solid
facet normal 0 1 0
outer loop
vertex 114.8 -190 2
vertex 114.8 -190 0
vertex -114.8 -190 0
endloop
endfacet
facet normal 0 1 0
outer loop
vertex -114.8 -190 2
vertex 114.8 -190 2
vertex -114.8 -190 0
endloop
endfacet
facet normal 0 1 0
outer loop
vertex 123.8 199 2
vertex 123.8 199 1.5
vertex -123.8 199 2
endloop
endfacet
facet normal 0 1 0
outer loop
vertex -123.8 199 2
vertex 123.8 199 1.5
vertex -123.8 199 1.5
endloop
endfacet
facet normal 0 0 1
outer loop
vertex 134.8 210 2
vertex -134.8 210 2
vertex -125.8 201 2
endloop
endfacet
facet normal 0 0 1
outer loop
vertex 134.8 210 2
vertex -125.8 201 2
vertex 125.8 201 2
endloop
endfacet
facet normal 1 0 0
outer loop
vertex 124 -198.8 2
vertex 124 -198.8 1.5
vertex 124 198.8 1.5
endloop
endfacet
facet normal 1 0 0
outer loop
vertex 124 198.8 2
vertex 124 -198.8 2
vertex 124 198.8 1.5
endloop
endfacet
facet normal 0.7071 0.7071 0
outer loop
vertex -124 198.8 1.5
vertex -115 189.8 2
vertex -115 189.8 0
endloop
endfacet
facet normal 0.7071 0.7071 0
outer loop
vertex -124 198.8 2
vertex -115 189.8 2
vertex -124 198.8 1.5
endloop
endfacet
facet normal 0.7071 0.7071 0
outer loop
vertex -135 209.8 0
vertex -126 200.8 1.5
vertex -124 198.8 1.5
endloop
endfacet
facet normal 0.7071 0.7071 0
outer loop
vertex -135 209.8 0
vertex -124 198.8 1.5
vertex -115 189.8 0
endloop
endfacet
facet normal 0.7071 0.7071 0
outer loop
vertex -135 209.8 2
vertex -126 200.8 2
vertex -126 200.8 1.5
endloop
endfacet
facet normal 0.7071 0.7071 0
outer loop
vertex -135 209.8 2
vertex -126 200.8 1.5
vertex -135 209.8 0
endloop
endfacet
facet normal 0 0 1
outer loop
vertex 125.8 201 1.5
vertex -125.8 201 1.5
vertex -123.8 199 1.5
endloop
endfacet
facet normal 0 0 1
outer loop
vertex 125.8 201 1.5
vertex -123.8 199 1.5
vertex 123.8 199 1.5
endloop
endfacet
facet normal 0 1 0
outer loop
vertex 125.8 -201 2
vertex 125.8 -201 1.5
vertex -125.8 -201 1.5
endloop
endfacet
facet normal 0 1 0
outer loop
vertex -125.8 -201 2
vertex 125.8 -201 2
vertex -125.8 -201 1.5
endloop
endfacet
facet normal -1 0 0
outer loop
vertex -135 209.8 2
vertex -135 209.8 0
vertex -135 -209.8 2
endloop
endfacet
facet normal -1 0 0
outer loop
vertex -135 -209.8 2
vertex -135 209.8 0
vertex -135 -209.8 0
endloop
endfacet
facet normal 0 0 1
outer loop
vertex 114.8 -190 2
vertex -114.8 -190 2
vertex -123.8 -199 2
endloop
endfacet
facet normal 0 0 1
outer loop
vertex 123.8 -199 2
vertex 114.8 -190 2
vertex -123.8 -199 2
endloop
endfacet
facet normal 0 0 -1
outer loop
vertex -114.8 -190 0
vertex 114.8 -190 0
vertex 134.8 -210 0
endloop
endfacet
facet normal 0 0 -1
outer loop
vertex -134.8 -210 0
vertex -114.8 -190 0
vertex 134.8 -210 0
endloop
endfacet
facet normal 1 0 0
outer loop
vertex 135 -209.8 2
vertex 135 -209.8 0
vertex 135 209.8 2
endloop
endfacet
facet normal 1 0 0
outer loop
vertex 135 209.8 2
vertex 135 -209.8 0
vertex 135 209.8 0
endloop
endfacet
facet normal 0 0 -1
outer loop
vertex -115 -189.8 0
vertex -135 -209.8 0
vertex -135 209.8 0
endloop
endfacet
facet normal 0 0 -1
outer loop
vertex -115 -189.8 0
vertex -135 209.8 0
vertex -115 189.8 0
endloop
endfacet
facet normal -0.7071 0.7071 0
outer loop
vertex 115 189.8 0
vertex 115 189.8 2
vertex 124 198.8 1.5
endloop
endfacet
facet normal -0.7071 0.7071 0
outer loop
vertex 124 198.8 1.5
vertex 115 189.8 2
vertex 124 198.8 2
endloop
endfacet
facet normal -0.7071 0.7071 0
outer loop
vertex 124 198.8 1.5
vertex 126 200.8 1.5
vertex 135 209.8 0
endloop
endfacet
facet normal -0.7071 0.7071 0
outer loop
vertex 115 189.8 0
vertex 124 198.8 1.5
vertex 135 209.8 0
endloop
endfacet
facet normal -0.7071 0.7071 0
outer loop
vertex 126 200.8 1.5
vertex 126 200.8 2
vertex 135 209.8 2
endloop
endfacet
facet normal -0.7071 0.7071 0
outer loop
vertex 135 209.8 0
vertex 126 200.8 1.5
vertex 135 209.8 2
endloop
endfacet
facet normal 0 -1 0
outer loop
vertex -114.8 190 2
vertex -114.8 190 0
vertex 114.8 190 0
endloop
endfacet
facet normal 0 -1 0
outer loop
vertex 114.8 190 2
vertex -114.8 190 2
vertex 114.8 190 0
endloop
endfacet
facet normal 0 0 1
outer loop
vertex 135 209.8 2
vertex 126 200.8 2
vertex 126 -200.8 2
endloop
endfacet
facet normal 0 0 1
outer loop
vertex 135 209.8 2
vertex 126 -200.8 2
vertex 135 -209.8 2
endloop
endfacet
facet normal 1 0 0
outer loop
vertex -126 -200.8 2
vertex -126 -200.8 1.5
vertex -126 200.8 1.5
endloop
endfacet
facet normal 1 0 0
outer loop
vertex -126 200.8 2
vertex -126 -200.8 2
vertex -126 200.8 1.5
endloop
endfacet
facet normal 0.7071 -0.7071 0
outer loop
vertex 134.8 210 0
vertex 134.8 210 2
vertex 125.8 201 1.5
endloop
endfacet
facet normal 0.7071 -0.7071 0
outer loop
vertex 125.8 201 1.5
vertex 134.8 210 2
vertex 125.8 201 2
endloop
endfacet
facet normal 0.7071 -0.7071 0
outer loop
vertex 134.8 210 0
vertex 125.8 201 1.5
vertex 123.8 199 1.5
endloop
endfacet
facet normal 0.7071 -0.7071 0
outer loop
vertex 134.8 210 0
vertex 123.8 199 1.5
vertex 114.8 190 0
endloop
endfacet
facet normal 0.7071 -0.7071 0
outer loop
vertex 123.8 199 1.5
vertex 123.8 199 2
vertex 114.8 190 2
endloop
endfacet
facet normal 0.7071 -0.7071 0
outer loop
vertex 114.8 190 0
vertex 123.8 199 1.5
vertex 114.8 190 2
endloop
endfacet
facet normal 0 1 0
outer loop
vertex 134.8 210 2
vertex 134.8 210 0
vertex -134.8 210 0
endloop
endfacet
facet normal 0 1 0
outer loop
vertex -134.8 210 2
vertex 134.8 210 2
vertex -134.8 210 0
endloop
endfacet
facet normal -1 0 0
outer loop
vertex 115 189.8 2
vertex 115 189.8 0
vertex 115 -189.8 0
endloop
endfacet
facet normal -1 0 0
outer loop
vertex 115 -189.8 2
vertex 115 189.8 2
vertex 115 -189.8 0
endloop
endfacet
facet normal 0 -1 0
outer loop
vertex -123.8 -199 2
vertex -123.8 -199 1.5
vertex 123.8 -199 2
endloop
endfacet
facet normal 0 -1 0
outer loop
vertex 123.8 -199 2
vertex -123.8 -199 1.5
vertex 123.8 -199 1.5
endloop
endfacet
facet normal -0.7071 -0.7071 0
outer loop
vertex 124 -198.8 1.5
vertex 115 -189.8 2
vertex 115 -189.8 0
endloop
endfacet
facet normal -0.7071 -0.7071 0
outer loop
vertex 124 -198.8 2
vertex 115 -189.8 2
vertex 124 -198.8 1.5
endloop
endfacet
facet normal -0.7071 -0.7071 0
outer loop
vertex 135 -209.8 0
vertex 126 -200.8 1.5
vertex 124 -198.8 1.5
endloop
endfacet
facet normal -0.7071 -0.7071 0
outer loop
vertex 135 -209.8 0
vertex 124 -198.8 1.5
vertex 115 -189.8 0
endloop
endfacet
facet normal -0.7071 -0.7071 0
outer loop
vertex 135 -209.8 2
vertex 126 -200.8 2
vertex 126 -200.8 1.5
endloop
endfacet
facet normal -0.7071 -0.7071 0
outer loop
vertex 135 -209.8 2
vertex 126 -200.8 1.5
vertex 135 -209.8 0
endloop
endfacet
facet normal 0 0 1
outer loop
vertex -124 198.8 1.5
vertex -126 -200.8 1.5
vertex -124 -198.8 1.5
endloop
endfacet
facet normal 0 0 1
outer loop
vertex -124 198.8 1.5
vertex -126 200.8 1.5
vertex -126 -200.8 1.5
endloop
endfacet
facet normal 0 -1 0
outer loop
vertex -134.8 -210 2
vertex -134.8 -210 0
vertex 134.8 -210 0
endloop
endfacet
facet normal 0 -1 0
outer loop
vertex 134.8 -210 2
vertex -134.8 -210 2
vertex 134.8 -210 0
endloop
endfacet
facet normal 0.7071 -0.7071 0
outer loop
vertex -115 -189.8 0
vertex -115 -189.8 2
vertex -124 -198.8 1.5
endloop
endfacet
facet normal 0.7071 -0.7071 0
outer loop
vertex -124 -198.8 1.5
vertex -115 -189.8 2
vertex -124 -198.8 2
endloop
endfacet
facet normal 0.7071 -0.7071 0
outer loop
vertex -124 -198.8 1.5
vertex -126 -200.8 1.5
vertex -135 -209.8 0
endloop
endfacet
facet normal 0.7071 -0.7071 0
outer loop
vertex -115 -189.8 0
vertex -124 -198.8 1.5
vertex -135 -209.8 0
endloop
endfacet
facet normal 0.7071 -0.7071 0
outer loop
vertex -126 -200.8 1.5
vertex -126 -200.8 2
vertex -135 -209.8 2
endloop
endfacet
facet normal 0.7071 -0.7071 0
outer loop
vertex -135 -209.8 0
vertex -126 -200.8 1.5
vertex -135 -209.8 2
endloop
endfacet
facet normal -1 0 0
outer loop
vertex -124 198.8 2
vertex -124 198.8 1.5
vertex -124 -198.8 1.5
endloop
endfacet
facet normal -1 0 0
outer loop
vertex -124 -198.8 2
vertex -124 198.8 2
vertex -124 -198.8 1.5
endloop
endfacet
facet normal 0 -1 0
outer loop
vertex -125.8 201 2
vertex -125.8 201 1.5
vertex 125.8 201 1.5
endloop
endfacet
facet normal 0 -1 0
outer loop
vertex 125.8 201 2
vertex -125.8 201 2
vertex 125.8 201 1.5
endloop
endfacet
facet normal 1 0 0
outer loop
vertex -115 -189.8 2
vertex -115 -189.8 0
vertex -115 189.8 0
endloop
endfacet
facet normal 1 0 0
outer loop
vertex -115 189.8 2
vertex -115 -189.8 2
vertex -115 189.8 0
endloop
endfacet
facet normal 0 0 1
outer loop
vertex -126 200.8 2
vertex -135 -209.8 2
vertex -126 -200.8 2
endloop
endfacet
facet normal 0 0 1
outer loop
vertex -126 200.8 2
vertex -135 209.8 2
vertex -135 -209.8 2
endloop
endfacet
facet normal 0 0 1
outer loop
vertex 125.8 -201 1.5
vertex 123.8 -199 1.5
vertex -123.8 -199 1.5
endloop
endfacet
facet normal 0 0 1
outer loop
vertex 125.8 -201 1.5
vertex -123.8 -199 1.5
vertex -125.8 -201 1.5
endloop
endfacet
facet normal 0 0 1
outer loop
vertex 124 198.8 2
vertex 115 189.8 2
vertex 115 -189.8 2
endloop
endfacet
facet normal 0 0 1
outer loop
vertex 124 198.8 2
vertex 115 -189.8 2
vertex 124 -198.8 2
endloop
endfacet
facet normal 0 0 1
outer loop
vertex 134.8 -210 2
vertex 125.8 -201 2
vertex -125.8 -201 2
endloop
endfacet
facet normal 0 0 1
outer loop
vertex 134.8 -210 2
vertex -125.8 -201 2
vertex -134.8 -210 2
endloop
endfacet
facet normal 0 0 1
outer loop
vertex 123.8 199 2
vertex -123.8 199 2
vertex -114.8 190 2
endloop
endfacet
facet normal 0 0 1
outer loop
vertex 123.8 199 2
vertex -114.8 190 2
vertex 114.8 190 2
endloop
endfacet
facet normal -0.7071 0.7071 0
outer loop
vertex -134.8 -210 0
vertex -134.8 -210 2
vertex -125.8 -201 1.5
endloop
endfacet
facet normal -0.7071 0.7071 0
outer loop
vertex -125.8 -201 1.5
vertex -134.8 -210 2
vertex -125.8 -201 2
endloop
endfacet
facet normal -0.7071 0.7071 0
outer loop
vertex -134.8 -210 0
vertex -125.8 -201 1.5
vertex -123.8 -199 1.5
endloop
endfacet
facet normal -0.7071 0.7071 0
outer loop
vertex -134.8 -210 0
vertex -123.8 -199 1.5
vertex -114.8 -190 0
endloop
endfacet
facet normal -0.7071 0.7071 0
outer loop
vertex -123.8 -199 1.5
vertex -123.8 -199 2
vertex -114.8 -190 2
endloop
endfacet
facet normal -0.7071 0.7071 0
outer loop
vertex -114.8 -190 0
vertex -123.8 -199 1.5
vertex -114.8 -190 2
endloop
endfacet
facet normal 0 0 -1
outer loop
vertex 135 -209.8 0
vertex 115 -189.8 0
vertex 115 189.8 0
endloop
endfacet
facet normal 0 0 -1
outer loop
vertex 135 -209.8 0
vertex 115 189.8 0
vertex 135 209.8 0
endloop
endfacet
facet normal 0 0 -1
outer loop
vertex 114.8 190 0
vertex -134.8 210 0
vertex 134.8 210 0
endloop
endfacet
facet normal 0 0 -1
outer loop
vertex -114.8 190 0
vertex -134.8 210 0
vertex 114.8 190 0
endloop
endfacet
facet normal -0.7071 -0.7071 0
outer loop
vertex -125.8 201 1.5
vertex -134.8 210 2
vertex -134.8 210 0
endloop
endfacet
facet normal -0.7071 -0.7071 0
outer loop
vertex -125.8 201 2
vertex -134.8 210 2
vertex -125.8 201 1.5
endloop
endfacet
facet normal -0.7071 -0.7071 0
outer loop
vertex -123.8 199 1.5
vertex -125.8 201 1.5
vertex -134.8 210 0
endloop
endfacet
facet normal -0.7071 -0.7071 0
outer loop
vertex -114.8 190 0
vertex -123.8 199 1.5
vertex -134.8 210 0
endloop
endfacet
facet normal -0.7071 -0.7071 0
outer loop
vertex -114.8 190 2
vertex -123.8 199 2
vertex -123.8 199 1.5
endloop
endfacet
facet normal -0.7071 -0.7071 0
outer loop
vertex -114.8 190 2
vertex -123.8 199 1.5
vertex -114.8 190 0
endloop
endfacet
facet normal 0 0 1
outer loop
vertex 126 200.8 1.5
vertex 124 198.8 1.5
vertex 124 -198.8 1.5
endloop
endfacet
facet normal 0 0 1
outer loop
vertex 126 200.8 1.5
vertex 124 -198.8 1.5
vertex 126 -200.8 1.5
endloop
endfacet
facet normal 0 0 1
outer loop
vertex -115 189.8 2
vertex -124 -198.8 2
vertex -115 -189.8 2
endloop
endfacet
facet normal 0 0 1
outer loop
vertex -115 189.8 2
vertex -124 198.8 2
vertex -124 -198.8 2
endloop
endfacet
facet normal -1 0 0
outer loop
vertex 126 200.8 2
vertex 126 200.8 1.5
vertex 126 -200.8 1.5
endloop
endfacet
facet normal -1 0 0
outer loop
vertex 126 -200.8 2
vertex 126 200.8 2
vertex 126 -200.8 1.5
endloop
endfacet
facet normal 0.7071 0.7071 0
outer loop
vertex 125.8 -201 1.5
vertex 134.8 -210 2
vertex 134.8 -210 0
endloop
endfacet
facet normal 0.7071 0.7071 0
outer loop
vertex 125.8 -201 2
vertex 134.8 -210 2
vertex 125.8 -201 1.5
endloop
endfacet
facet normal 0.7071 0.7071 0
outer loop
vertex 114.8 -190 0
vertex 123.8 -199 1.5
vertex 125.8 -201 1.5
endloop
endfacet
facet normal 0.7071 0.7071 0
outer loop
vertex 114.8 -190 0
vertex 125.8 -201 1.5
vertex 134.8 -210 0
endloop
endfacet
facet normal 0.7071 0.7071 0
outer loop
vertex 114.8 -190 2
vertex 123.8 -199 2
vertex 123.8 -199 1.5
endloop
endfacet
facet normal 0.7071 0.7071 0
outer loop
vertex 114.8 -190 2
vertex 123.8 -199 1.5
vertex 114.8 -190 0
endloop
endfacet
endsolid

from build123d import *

# Parameters (mm, degrees)
CROQUIS1_W                = 248
CROQUIS1_H                = 398
CROQUIS1_W_2              = 230
CROQUIS1_H_2              = 380
SALIENTE_EXTRUIR1_DEPTH   = 2
CROQUIS1_W_3              = 270
CROQUIS1_H_3              = 420
CROQUIS1_W_4              = 252
CROQUIS1_H_4              = 402
SALIENTE_EXTRUIR1_2_DEPTH = 2
CROQUIS1_3_W              = 252
CROQUIS1_3_H              = 402
CROQUIS1_3_W_2            = 248
CROQUIS1_3_H_2            = 398
SALIENTE_EXTRUIR2_DEPTH   = 1.5
CORTAR_EXTRUIR1_DEPTH     = 21


with BuildPart() as part:
    # Croquis1 → Saliente-Extruir1 (new body)
    with BuildSketch(Plane.XY):
        Rectangle(CROQUIS1_W, CROQUIS1_H)
        Rectangle(CROQUIS1_W_2, CROQUIS1_H_2, mode=Mode.SUBTRACT)
    extrude(amount=SALIENTE_EXTRUIR1_DEPTH)



with BuildPart() as body_2:
    # Croquis1 → Saliente-Extruir1 2 (new body)
    with BuildSketch(Plane.XY):
        Rectangle(CROQUIS1_W_3, CROQUIS1_H_3)
        Rectangle(CROQUIS1_W_4, CROQUIS1_H_4, mode=Mode.SUBTRACT)
    extrude(amount=SALIENTE_EXTRUIR1_2_DEPTH)


with BuildPart() as part_1:
    add(part.part)

    add(body_2.part)  # Saliente-Extruir2 merges body 2
    # Croquis1<3> → Saliente-Extruir2 (add)
    with BuildSketch(Plane.XY):
        Rectangle(CROQUIS1_3_W, CROQUIS1_3_H)
        Rectangle(CROQUIS1_3_W_2, CROQUIS1_3_H_2, mode=Mode.SUBTRACT)
    extrude(amount=SALIENTE_EXTRUIR2_DEPTH)

    # Croquis2 → Cortar-Extruir1 (cut)
    with BuildSketch(Plane.XY.offset(2)):
        Polygon((-115, 189.8), (-135, 209.8), (-135, 210), (-134.8, 210), (-114.8, 190), (-115, 190), align=None)
        Polygon((115, 190), (115, 189.8), (135, 209.8), (135, 210), (134.8, 210), (114.8, 190), align=None)
        Polygon((115, -189.8), (135, -209.8), (135, -210), (134.8, -210), (114.8, -190), (115, -190), align=None)
        Polygon((-115, -190), (-115, -189.8), (-135, -209.8), (-135, -210), (-134.8, -210), (-114.8, -190), align=None)
    extrude(amount=-CORTAR_EXTRUIR1_DEPTH, mode=Mode.SUBTRACT)


with BuildPart() as cortar_extruir1_piece_1:
    # of the separate pieces the step leaves, piece 1, a body of its own (cortar_extruir1_pieces)
    add(part_1.part.solids().sort_by_distance((124, 198.8, 1.5))[0])


with BuildPart() as cortar_extruir1_piece_2:
    # of the separate pieces the step leaves, piece 2, a body of its own (cortar_extruir1_pieces)
    add(part_1.part.solids().sort_by_distance((-124, 198.8, 2))[0])


with BuildPart() as cortar_extruir1_piece_3:
    # of the separate pieces the step leaves, piece 3, a body of its own (cortar_extruir1_pieces)
    add(part_1.part.solids().sort_by_distance((123.8, 199, 2))[0])


with BuildPart() as cortar_extruir1_piece_4:
    # of the separate pieces the step leaves, piece 4, a body of its own (cortar_extruir1_pieces)
    add(part_1.part.solids().sort_by_distance((123.8, -199, 2))[0])


solid = Compound([cortar_extruir1_piece_1.part, cortar_extruir1_piece_2.part, cortar_extruir1_piece_3.part, cortar_extruir1_piece_4.part])
